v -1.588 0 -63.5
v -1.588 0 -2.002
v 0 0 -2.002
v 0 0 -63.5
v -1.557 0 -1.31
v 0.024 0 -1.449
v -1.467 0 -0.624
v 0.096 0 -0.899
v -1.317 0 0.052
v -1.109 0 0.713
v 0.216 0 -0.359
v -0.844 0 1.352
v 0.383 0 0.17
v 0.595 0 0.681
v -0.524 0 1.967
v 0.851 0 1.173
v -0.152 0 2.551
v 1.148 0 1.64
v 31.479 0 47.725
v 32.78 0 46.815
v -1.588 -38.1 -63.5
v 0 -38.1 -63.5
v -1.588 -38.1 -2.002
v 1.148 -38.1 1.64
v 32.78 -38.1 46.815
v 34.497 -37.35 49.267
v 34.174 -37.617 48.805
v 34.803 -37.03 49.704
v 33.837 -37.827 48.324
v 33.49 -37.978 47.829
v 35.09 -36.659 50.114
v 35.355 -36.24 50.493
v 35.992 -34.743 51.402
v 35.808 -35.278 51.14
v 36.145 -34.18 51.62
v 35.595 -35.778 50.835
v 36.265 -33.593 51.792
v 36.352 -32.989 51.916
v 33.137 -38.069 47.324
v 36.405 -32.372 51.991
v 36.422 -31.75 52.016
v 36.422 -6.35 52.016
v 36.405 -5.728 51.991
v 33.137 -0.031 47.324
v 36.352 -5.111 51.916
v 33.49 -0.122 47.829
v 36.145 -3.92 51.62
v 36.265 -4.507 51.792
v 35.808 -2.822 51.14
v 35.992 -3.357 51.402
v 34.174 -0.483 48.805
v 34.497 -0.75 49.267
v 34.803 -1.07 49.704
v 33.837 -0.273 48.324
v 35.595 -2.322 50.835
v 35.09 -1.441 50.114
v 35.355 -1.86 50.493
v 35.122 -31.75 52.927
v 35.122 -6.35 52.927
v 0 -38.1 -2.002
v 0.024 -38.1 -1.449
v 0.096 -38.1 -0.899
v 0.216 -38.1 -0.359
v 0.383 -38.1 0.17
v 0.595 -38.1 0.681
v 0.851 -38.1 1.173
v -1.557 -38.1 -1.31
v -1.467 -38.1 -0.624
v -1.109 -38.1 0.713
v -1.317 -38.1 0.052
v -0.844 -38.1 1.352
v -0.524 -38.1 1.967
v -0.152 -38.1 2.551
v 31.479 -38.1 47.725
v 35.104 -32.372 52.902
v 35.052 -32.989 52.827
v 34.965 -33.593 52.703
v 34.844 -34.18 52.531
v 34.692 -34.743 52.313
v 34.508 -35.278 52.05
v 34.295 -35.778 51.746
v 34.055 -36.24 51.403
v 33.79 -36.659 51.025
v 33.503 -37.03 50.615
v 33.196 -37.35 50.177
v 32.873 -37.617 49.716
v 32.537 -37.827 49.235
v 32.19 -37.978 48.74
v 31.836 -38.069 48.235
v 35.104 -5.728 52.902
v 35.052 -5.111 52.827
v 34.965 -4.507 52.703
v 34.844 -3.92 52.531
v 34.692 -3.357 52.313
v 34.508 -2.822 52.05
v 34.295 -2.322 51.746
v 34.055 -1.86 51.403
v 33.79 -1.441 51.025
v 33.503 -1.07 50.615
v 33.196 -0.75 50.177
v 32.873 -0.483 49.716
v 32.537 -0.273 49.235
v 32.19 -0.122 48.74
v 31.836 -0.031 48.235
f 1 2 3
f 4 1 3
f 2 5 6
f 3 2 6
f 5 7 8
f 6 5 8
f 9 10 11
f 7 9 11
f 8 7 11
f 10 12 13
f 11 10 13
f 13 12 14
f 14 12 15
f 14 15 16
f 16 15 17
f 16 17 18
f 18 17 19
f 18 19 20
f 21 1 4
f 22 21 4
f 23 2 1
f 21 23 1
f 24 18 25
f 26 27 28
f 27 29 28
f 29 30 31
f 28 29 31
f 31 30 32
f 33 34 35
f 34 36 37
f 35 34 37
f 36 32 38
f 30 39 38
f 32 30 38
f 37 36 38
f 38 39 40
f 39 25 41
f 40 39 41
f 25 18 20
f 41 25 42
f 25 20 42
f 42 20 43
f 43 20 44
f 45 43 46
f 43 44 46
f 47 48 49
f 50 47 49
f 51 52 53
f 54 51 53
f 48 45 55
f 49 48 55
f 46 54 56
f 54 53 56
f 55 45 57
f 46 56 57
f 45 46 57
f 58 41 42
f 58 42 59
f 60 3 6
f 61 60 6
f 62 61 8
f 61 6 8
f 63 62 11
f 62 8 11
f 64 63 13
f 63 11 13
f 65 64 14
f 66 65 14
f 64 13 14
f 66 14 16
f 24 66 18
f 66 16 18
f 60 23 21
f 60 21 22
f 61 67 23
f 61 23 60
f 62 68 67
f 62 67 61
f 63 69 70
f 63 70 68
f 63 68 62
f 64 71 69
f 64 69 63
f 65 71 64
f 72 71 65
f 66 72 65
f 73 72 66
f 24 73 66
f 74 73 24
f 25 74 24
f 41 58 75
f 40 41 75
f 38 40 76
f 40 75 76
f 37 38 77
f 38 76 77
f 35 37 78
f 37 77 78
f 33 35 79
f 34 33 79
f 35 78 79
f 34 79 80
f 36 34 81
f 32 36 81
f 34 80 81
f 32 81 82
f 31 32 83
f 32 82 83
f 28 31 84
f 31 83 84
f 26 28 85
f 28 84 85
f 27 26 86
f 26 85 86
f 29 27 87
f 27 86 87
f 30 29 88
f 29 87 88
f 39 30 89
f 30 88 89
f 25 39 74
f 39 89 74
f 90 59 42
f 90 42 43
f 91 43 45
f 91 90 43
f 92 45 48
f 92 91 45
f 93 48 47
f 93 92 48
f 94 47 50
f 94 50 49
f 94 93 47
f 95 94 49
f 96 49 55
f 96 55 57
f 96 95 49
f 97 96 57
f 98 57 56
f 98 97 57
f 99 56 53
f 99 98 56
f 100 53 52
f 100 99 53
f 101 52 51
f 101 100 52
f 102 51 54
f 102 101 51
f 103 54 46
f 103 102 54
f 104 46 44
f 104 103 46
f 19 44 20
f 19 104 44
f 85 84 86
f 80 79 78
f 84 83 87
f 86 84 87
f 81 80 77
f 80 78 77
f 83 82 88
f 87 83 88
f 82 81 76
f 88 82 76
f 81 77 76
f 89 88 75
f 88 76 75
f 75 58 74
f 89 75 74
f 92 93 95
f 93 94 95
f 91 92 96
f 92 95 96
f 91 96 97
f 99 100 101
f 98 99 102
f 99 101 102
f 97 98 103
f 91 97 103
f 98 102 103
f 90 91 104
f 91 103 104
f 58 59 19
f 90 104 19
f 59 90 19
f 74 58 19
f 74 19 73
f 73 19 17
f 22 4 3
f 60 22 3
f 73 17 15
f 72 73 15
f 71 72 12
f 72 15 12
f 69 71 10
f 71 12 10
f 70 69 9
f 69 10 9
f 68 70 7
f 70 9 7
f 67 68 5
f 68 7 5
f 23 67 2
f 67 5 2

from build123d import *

# Parameters (mm, degrees)
F1_DEPTH = 38.1
F2_R     = 6.35


with BuildPart() as f1:
    # F0 (on Front) → F1 (new body)
    with BuildSketch(Plane.XZ):
        with BuildLine():
            Line((0, -63.5), (0, -2.002147))
            ThreePointArc((0, -2.002147), (0.293897, -0.092665), (1.148385, 1.640063))
            Line((1.148385, 1.640063), (36.422104, 52.016155))
            Line((36.422104, 52.016155), (35.1217, 52.926707))
            Line((35.1217, 52.926707), (-0.152019, 2.550616))
            ThreePointArc((-0.152019, 2.550616), (-1.220128, 0.384705), (-1.5875, -2.002147))
            Line((-1.5875, -2.002147), (-1.5875, -63.5))
            Line((-1.5875, -63.5), (0, -63.5))
        make_face()
    extrude(amount=F1_DEPTH)

    # F2
    f2_edges = [f1.edges().sort_by_distance(p)[0] for p in [
        (35.771902, -38.1, 52.471431),
        (35.771902, 0, 52.471431),
    ]]
    fillet(f2_edges, radius=F2_R)


solid = f1.part
